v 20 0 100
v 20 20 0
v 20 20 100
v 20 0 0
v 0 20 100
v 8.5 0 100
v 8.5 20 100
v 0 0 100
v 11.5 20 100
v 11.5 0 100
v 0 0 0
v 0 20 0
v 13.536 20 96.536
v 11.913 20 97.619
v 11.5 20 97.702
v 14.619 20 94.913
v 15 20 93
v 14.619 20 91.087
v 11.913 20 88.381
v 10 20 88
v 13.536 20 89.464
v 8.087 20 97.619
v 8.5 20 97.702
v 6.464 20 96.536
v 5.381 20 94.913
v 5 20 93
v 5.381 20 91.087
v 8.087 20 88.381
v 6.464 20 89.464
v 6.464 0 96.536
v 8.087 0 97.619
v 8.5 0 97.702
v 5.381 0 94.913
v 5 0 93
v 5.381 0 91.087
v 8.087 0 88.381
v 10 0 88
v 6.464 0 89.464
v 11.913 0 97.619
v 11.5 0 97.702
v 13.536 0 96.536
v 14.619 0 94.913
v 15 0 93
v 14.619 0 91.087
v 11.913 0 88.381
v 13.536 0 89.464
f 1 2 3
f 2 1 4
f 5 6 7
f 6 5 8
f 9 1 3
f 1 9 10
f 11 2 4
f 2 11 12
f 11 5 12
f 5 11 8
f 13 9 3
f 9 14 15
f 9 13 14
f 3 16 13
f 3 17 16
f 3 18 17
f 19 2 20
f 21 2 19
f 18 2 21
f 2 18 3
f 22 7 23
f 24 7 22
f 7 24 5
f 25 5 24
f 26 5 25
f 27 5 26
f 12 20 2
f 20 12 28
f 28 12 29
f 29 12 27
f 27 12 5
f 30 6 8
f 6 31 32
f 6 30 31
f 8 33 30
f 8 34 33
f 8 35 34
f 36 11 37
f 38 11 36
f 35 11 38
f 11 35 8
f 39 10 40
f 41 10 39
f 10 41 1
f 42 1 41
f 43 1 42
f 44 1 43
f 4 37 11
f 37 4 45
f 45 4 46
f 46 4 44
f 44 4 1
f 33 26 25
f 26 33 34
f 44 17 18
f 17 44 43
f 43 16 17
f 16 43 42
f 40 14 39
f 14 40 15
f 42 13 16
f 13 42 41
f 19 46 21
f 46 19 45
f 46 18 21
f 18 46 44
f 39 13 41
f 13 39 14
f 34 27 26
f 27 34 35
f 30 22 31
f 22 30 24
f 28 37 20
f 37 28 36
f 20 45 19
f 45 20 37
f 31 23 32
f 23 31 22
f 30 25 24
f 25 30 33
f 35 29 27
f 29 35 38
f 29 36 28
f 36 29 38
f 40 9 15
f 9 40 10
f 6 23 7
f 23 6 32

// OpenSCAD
mouse_suspension();

module mouse_suspension() {
    difference() {
        cube([20, 20, 100]);
        translate([10, 21, 100-5-2])
        rotate([90, 0, 0])
        cylinder(22, 5, 5);
        translate([10-1.5, -1, 100-2.5])
        cube([3, 22, 3]);
    }
}
